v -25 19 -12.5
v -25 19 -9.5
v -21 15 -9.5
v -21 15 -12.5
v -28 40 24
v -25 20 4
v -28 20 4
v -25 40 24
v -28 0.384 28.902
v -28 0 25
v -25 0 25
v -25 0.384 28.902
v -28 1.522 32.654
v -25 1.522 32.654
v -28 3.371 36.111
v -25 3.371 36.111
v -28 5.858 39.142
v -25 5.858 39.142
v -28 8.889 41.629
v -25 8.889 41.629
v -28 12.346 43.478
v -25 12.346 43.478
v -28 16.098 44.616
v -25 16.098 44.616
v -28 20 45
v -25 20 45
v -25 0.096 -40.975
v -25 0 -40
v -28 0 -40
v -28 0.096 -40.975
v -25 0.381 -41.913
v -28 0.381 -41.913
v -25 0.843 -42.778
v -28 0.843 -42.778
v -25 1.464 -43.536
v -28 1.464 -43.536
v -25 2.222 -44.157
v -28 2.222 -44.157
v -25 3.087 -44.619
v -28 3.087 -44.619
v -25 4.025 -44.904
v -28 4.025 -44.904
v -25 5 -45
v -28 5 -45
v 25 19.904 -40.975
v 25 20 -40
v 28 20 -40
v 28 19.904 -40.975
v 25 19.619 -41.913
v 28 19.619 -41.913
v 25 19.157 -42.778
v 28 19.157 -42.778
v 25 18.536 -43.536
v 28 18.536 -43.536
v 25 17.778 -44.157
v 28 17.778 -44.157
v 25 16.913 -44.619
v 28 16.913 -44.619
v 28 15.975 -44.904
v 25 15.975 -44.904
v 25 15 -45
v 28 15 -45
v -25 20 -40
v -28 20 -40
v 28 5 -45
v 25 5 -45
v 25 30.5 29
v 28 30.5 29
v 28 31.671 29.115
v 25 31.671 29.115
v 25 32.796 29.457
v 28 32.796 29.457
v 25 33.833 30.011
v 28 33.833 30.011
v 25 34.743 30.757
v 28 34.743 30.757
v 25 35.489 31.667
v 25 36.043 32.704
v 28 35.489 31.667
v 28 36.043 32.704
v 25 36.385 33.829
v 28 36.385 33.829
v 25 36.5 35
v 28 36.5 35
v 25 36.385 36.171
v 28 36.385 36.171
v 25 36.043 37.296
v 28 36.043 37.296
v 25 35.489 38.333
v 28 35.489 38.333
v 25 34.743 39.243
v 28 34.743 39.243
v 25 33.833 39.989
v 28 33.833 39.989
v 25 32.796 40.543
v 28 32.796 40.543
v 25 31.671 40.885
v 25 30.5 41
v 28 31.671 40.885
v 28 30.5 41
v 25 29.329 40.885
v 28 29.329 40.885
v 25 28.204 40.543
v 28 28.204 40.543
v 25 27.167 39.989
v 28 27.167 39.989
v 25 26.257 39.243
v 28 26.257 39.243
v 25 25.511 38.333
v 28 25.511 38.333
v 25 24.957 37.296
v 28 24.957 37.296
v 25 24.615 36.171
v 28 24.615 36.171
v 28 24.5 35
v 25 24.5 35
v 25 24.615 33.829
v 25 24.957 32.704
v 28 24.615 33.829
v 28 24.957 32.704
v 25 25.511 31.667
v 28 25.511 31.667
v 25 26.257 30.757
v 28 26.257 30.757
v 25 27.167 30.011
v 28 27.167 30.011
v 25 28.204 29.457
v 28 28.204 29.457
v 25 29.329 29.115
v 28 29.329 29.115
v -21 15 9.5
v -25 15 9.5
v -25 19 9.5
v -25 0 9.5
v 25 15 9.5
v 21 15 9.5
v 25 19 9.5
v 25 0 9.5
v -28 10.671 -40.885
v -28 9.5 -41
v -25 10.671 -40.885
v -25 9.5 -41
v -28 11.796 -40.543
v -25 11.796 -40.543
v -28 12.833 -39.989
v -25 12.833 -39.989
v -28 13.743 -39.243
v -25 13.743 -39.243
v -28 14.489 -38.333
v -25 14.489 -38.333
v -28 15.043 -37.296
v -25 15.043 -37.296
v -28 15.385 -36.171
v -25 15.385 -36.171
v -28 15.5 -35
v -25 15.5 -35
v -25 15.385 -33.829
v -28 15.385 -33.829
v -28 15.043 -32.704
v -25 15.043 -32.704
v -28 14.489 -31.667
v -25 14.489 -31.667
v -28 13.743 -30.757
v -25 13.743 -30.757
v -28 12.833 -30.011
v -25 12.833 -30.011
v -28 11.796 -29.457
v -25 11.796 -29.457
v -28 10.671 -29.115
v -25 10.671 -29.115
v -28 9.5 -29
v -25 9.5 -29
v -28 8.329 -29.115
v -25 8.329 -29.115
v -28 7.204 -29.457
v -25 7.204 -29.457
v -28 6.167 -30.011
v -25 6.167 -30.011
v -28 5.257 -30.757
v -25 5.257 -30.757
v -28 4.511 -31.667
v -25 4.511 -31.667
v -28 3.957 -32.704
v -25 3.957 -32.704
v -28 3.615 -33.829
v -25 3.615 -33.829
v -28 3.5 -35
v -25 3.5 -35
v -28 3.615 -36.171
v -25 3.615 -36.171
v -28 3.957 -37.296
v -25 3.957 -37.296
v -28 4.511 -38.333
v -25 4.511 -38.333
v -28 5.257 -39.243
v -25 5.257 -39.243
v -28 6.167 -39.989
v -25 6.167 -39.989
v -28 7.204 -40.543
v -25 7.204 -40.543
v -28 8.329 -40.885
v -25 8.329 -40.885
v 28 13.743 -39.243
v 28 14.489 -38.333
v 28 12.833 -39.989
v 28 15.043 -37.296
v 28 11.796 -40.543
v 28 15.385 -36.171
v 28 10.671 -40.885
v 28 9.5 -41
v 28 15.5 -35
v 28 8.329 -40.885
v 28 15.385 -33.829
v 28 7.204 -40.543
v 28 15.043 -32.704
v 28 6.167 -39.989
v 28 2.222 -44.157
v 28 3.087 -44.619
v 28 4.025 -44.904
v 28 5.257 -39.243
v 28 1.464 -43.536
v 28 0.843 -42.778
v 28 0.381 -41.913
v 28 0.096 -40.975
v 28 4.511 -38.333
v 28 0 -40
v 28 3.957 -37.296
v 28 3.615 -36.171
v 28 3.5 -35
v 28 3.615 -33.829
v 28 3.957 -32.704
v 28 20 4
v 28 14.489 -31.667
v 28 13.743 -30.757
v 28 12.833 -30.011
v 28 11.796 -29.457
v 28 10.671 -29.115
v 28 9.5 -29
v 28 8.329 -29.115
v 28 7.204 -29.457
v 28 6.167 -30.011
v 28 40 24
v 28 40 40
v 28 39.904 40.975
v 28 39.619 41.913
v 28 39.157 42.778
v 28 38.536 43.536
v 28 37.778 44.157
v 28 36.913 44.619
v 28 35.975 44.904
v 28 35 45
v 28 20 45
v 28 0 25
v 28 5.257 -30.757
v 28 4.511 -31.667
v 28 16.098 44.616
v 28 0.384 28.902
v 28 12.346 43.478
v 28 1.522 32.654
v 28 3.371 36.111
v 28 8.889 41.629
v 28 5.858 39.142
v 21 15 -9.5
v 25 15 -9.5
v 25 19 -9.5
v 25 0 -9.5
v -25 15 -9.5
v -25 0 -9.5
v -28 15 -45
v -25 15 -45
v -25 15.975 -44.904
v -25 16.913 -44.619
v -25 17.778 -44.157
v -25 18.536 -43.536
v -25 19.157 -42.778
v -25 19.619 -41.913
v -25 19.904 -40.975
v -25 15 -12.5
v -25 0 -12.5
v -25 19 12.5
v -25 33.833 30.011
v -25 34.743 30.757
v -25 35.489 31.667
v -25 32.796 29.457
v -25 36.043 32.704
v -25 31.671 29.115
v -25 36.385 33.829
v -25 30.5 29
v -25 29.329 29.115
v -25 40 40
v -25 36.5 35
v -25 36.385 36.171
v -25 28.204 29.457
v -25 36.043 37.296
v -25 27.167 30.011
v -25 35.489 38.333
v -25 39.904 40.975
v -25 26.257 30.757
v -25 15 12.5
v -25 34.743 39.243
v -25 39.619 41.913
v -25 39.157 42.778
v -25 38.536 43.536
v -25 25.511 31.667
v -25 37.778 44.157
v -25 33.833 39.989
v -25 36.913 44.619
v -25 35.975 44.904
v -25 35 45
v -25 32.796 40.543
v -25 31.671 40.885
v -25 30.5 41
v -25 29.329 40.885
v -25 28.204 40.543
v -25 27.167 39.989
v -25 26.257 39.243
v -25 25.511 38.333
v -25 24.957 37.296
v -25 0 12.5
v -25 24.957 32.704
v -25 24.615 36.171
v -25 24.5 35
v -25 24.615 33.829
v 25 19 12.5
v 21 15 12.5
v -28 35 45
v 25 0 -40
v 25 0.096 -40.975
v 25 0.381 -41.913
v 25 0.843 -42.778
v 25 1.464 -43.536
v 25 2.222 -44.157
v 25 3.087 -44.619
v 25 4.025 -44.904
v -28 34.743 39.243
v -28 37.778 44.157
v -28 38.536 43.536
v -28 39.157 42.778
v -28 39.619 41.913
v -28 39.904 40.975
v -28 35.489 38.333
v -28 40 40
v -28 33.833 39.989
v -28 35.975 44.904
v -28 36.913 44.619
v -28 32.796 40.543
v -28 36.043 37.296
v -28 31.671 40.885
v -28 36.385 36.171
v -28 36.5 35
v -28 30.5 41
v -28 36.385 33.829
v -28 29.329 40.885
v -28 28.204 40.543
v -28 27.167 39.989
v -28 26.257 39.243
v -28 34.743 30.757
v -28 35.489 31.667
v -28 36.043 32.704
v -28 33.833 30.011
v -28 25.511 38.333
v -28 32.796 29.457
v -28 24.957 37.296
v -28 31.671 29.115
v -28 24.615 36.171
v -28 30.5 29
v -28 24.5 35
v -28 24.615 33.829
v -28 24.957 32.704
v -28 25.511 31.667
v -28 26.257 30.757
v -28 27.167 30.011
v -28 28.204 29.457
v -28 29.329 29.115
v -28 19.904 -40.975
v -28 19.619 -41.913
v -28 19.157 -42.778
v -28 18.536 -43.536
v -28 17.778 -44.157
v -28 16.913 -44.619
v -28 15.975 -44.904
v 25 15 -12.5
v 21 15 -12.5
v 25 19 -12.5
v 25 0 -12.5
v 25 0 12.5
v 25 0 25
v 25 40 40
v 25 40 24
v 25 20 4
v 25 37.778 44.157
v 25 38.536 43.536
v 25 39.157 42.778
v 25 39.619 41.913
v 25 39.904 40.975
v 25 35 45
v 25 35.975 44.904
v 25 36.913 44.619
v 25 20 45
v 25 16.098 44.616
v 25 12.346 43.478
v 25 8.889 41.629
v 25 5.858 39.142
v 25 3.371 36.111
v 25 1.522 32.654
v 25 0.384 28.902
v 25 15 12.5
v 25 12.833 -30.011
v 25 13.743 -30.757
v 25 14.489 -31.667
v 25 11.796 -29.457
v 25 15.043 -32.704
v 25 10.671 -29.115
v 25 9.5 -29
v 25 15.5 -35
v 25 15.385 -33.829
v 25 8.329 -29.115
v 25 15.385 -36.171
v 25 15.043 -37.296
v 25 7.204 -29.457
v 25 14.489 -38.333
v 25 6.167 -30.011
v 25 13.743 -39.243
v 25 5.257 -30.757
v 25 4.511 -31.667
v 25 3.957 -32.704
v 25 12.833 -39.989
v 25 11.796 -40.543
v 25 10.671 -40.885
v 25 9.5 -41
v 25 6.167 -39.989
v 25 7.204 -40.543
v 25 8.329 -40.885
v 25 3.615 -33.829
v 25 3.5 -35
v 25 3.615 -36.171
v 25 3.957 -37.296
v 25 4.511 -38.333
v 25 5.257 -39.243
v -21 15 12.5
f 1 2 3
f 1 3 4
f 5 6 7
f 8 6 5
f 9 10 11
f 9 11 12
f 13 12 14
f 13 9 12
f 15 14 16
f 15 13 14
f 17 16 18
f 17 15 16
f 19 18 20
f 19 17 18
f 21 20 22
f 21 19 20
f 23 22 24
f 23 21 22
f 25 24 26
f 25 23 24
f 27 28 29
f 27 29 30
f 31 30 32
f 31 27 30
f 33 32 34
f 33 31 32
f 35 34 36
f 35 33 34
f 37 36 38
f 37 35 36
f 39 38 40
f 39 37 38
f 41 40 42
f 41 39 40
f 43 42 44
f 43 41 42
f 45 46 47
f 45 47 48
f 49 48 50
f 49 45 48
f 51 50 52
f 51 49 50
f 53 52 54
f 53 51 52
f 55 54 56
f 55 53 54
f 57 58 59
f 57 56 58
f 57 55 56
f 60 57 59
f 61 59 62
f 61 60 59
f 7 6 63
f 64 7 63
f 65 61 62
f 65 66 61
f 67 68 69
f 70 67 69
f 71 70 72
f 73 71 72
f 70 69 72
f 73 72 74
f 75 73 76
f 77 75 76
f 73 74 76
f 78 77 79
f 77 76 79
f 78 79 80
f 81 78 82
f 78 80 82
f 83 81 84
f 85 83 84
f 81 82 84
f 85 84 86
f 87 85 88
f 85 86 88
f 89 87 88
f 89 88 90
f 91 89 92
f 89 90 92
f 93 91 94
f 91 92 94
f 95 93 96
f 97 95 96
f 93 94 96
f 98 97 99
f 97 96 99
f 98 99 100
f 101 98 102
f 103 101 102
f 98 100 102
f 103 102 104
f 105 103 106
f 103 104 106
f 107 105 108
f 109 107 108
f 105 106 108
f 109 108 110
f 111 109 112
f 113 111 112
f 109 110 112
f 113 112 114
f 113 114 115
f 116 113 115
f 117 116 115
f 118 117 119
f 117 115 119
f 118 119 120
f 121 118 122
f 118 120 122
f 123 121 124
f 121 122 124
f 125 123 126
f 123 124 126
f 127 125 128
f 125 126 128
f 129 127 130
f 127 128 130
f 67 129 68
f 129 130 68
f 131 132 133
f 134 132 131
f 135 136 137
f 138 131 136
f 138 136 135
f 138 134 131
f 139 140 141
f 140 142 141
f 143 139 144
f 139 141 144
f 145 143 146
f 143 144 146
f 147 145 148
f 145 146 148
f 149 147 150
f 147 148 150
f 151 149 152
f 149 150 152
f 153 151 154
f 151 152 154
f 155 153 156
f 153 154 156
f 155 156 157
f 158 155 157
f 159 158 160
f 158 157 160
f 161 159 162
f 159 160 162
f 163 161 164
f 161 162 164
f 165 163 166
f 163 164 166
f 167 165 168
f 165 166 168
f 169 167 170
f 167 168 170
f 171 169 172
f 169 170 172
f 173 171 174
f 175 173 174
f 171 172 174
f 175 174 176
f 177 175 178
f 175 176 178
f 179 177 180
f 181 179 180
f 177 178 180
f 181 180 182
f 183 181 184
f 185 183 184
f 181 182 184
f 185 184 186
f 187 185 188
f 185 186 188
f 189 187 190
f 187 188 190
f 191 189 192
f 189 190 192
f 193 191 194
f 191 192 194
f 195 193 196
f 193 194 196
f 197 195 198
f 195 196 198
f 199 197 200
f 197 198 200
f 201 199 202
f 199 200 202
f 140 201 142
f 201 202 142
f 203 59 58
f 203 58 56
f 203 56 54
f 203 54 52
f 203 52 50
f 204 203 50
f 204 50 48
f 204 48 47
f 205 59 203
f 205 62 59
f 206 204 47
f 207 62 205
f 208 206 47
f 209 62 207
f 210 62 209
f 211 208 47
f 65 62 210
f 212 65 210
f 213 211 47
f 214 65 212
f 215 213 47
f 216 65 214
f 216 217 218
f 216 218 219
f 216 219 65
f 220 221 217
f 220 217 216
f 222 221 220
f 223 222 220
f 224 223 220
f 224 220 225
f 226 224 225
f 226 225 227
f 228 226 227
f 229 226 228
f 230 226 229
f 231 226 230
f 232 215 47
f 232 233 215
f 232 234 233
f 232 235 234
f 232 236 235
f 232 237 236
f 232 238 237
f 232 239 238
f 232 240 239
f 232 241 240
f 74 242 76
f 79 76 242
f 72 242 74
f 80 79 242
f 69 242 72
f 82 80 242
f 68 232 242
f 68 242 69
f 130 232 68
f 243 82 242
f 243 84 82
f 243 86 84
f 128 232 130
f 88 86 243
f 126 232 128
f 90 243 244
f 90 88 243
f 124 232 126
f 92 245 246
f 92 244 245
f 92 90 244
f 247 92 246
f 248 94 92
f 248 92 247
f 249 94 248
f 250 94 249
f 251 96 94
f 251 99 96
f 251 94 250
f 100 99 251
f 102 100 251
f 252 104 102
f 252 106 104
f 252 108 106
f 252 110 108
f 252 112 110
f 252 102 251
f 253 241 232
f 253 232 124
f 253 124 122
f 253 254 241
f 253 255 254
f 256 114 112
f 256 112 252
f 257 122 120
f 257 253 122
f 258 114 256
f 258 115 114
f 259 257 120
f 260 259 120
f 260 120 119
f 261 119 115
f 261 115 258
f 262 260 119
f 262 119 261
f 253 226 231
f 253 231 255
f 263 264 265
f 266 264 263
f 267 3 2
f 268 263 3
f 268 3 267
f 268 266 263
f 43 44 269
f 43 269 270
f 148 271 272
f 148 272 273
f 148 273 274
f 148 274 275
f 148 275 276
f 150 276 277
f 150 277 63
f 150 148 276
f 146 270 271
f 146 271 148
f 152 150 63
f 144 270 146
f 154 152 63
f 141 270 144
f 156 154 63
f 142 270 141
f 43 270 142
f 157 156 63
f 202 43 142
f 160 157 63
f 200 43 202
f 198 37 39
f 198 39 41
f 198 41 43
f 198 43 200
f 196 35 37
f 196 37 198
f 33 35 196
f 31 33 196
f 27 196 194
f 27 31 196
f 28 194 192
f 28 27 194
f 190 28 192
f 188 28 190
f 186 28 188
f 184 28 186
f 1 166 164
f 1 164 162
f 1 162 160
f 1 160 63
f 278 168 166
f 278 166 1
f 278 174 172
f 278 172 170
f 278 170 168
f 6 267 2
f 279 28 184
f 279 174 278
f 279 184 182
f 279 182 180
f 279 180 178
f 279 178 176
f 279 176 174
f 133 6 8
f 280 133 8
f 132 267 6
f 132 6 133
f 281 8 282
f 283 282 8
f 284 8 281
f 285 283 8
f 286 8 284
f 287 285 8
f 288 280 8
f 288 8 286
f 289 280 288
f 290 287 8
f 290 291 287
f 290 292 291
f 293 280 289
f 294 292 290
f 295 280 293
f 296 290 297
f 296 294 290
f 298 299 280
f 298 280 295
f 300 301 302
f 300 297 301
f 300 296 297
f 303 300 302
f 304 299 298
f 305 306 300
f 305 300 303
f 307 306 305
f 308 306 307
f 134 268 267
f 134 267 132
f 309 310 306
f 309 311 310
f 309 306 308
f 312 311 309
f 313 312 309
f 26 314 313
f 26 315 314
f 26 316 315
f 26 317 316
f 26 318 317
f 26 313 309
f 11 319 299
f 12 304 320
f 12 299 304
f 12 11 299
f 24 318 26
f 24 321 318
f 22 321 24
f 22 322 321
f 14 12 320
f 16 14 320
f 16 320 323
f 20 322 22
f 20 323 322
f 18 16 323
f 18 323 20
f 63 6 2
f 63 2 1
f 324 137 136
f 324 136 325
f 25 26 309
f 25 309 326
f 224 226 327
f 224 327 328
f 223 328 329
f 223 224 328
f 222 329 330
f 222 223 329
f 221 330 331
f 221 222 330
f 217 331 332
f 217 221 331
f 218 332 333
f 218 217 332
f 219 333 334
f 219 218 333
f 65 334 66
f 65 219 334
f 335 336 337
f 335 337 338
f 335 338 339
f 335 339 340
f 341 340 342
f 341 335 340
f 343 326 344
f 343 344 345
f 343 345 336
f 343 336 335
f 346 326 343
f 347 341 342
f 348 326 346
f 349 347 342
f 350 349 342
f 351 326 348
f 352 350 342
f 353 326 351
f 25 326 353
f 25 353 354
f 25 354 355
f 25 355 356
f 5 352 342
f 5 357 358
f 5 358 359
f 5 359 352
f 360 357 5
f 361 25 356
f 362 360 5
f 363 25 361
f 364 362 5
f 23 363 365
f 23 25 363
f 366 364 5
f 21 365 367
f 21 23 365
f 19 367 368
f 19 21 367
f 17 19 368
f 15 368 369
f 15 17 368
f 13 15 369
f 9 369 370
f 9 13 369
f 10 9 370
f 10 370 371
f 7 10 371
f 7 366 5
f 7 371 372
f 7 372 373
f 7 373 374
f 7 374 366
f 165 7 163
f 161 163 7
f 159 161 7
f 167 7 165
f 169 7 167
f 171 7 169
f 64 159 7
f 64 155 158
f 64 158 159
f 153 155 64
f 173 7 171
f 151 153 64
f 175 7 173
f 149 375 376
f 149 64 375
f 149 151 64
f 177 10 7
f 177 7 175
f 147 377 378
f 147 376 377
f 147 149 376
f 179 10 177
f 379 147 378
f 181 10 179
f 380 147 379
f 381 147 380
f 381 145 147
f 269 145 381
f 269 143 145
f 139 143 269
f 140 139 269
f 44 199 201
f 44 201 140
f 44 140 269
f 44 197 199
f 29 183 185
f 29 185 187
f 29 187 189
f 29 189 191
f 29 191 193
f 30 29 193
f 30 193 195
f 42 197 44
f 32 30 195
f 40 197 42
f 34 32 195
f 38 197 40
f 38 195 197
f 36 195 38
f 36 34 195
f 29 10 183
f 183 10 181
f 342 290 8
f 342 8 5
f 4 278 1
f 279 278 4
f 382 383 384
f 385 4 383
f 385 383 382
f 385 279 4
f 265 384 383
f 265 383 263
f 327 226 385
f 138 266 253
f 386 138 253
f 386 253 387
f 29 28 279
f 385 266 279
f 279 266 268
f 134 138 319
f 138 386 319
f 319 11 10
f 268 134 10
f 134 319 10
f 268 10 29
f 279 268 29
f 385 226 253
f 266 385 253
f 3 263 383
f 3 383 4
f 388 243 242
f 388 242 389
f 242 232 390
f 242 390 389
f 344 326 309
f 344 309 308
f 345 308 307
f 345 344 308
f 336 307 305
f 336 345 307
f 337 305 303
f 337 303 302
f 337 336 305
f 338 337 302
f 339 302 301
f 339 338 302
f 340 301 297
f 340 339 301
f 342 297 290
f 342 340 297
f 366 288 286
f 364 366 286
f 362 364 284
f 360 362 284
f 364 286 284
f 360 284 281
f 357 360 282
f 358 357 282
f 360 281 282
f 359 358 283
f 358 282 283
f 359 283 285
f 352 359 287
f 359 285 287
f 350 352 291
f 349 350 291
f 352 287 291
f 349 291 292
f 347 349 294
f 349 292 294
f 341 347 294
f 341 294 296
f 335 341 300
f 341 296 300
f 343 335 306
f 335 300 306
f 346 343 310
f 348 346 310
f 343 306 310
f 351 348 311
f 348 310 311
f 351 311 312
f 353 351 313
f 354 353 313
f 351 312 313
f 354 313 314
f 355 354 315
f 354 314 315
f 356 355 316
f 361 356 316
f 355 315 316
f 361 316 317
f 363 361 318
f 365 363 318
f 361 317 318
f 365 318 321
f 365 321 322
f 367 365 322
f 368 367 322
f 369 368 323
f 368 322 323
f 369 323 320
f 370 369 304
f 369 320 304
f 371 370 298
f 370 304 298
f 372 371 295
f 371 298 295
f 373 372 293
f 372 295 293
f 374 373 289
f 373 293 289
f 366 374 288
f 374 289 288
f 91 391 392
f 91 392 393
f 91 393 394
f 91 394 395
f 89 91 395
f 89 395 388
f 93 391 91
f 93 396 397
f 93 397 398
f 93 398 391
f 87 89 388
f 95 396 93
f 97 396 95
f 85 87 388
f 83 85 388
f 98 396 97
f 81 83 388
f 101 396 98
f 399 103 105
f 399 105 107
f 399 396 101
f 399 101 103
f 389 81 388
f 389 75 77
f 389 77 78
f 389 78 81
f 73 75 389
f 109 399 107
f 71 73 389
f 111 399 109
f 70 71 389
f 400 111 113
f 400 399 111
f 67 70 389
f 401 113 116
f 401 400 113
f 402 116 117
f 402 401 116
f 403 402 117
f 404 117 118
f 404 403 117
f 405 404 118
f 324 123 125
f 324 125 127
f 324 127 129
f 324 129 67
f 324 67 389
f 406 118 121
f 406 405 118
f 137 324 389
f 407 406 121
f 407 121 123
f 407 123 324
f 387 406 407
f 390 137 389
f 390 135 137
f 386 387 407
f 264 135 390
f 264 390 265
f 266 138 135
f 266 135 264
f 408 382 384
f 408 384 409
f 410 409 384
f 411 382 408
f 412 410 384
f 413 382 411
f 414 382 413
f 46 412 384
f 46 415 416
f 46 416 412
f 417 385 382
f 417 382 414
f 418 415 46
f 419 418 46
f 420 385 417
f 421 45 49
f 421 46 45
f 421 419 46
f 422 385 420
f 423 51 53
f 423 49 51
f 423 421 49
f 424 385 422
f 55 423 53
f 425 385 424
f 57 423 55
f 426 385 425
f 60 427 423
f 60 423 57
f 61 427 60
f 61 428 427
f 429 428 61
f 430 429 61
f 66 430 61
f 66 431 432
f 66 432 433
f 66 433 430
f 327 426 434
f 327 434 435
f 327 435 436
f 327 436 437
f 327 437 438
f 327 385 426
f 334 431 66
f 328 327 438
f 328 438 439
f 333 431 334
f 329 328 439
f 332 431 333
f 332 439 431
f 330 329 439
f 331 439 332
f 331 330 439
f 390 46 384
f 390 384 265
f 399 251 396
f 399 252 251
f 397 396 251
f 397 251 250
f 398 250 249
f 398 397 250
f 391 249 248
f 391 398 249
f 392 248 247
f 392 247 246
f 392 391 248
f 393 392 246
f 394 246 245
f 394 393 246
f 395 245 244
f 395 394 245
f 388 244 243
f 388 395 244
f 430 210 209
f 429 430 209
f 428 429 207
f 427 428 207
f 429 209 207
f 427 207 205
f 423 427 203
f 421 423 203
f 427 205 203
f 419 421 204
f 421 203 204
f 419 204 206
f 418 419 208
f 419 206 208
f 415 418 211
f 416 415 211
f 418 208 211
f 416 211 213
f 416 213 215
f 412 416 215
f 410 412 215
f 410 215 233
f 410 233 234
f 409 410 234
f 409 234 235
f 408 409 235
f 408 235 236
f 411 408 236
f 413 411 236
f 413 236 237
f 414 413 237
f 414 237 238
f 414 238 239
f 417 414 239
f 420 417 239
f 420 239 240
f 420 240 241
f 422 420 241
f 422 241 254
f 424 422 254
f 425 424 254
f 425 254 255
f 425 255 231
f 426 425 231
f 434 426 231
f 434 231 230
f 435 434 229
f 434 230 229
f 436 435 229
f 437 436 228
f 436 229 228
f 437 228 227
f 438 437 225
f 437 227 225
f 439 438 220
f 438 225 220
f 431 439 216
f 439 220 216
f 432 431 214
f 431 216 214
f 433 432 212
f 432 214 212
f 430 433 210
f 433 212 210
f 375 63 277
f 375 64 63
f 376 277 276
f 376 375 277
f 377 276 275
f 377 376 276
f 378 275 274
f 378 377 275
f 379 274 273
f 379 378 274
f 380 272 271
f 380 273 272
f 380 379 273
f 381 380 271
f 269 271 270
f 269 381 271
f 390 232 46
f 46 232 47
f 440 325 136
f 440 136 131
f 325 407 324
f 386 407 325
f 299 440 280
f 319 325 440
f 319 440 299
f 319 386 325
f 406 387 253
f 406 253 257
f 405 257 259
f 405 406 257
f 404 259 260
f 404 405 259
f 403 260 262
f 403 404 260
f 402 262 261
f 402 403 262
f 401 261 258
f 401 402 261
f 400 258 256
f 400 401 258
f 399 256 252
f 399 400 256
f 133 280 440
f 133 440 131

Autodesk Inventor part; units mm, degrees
ref_plane "YZ Plane" through (0, 0, 0) normal (1, 0, 0) x (0, 1, 0)
ref_plane "XZ Plane" through (0, 0, 0) normal (0, 1, 0) x (-1, 0, 0)
ref_plane "XY Plane" through (0, 0, 0) normal (0, 0, 1) x (1, 0, 0)
sketch "Esquisse1" plane through (0, 0, 0) normal (0, 1, 0) x (-1, 0, 0)
  line L0 (-25, -45) -> (-28, -45)
  line L1 (-28, -45) -> (-28, 45)
  line L2 (-28, 45) -> (-25, 45)
  line L3 (-25, 45) -> (-25, -45)
  line L4 (25, 45) -> (28, 45)
  line L5 (28, 45) -> (28, -45)
  line L6 (28, -45) -> (25, -45)
  line L7 (25, -45) -> (25, 45)
  line L8 (-25, 12.5) -> (25, 12.5)
  line L9 (25, 12.5) -> (25, 9.5)
  line L10 (25, 9.5) -> (-25, 9.5)
  line L11 (-25, 9.5) -> (-25, 12.5)
  line L12 (-25, -9.5) -> (25, -9.5)
  line L13 (25, -9.5) -> (25, -12.5)
  line L14 (25, -12.5) -> (-25, -12.5)
  line L15 (-25, -12.5) -> (-25, -9.5)
  point P0 (0, 0)
  dimension "d0" = 50
  dimension "d1" = 3
  dimension "d2" = 3
  dimension "d3" = 3
  dimension "d4" = 3
  dimension "d5" = 25
  dimension "d6" = 90
  dimension "d7" = 25
  dimension "d9" = 45
  dimension "d10" = 12.5
extrude "Extrusion1" add sketch "Esquisse1" along normal blind 40 contours L0 L1 L2 L3 | L3 L12 L7 L14 | L7 L4 L5 L6 | L3 L8 L7 L10
sketch "Esquisse2" plane through (28, 0, 45) normal (1, 0, 0) x (0, 0, -1)
  line L0 (90, 0) -> (90, 40) projected
  line L1 (0, 0) -> (0, 40) projected
  circle A0 centre (80, 9.5) radius 6
  line L2 (0, 40) -> (90, 40) projected
  line L3 (80, 9.5) -> (10, 9.5) construction
  line L4 (10, 9.5) -> (10, 30.5) construction
  line L5 (10, 30.5) -> (80, 30.5) construction
  line L6 (80, 30.5) -> (80, 9.5) construction
  circle A1 centre (10, 30.5) radius 6
  line L7 (0, 0) -> (90, 0) projected
  line L8 (90, 40) -> (41, 40)
  line L9 (41, 40) -> (41, 20)
  line L10 (41, 20) -> (90, 20)
  line L11 (90, 20) -> (90, 40)
  line L12 (41, 40) -> (21, 40)
  line L13 (21, 40) -> (21, 20) construction
  line L14 (21, 20) -> (41, 20) construction
  line L15 (41, 20) -> (41, 40)
  line L16 (41, 20) -> (21, 40)
  point P0 (45, 0)
  dimension "d14" = 12
  dimension "d21" = 10
  dimension "d22" = 10
  dimension "d23" = 12
  dimension "d24" = 21
  dimension "d25" = 9.5
  dimension "d26" = 40
  dimension "d27" = 20
  dimension "d28" = 20
  dimension "d29" = 21
extrude "Extrusion2" cut sketch "Esquisse2" against normal through all contours L10 L9 L2 L0 | L16 L2 L9 | A0 | A1
sketch "Esquisse4" plane through (-25, 0, 12.5) normal (0, 0, 1) x (1, 0, 0)
  line L0 (50, 28.5) -> (0, 28.5) projected
  line L1 (0, 0) -> (0, 28.5) projected
  line L2 (0, 0) -> (50, 0) projected
  line L3 (0, 0) -> (50, 0)
  line L4 (50, 0) -> (50, 15)
  line L5 (50, 15) -> (0, 15)
  line L6 (0, 15) -> (0, 0)
  line L7 (50, 0) -> (50, 40) projected
  line L8 (50, 40) -> (53, 40) projected
  point P0 (25, 0)
  dimension "d33" = 25
extrude "Extrusion3" cut sketch "Esquisse4" against normal through all contours L7 L5 L1 L0
fillet "Congé2" radius 20 2 edges at (26.5, 0, 45) (-26.5, 0, 45)
fillet "Congé3" radius 5 6 edges at (26.5, 40, 45) (-26.5, 40, 45) (26.5, 20, -45) (26.5, 0, -45) (-26.5, 20, -45) (-26.5, 0, -45)
chamfer "Chanfrein1" distance 4 angle 45 4 edges at (-25, 15, 11) (-25, 15, -11) (25, 15, -11) (25, 15, 11)
equation "\"d2\" = d1"
equation "\"d4\" = d3"
equation "\"d5\" = 0.5 * d0"
equation "\"d9\" = 0.5 * d6"
equation "\"d10\" = 0.5 * d7"
equation "\"d23\" = d14"
equation "\"d25\" = -0.5 * d24 + 0.5 * d26"
equation "\"d27\" = 0.5 * d26"
equation "\"d28\" = d27"
properties part number "new_leg_1"
